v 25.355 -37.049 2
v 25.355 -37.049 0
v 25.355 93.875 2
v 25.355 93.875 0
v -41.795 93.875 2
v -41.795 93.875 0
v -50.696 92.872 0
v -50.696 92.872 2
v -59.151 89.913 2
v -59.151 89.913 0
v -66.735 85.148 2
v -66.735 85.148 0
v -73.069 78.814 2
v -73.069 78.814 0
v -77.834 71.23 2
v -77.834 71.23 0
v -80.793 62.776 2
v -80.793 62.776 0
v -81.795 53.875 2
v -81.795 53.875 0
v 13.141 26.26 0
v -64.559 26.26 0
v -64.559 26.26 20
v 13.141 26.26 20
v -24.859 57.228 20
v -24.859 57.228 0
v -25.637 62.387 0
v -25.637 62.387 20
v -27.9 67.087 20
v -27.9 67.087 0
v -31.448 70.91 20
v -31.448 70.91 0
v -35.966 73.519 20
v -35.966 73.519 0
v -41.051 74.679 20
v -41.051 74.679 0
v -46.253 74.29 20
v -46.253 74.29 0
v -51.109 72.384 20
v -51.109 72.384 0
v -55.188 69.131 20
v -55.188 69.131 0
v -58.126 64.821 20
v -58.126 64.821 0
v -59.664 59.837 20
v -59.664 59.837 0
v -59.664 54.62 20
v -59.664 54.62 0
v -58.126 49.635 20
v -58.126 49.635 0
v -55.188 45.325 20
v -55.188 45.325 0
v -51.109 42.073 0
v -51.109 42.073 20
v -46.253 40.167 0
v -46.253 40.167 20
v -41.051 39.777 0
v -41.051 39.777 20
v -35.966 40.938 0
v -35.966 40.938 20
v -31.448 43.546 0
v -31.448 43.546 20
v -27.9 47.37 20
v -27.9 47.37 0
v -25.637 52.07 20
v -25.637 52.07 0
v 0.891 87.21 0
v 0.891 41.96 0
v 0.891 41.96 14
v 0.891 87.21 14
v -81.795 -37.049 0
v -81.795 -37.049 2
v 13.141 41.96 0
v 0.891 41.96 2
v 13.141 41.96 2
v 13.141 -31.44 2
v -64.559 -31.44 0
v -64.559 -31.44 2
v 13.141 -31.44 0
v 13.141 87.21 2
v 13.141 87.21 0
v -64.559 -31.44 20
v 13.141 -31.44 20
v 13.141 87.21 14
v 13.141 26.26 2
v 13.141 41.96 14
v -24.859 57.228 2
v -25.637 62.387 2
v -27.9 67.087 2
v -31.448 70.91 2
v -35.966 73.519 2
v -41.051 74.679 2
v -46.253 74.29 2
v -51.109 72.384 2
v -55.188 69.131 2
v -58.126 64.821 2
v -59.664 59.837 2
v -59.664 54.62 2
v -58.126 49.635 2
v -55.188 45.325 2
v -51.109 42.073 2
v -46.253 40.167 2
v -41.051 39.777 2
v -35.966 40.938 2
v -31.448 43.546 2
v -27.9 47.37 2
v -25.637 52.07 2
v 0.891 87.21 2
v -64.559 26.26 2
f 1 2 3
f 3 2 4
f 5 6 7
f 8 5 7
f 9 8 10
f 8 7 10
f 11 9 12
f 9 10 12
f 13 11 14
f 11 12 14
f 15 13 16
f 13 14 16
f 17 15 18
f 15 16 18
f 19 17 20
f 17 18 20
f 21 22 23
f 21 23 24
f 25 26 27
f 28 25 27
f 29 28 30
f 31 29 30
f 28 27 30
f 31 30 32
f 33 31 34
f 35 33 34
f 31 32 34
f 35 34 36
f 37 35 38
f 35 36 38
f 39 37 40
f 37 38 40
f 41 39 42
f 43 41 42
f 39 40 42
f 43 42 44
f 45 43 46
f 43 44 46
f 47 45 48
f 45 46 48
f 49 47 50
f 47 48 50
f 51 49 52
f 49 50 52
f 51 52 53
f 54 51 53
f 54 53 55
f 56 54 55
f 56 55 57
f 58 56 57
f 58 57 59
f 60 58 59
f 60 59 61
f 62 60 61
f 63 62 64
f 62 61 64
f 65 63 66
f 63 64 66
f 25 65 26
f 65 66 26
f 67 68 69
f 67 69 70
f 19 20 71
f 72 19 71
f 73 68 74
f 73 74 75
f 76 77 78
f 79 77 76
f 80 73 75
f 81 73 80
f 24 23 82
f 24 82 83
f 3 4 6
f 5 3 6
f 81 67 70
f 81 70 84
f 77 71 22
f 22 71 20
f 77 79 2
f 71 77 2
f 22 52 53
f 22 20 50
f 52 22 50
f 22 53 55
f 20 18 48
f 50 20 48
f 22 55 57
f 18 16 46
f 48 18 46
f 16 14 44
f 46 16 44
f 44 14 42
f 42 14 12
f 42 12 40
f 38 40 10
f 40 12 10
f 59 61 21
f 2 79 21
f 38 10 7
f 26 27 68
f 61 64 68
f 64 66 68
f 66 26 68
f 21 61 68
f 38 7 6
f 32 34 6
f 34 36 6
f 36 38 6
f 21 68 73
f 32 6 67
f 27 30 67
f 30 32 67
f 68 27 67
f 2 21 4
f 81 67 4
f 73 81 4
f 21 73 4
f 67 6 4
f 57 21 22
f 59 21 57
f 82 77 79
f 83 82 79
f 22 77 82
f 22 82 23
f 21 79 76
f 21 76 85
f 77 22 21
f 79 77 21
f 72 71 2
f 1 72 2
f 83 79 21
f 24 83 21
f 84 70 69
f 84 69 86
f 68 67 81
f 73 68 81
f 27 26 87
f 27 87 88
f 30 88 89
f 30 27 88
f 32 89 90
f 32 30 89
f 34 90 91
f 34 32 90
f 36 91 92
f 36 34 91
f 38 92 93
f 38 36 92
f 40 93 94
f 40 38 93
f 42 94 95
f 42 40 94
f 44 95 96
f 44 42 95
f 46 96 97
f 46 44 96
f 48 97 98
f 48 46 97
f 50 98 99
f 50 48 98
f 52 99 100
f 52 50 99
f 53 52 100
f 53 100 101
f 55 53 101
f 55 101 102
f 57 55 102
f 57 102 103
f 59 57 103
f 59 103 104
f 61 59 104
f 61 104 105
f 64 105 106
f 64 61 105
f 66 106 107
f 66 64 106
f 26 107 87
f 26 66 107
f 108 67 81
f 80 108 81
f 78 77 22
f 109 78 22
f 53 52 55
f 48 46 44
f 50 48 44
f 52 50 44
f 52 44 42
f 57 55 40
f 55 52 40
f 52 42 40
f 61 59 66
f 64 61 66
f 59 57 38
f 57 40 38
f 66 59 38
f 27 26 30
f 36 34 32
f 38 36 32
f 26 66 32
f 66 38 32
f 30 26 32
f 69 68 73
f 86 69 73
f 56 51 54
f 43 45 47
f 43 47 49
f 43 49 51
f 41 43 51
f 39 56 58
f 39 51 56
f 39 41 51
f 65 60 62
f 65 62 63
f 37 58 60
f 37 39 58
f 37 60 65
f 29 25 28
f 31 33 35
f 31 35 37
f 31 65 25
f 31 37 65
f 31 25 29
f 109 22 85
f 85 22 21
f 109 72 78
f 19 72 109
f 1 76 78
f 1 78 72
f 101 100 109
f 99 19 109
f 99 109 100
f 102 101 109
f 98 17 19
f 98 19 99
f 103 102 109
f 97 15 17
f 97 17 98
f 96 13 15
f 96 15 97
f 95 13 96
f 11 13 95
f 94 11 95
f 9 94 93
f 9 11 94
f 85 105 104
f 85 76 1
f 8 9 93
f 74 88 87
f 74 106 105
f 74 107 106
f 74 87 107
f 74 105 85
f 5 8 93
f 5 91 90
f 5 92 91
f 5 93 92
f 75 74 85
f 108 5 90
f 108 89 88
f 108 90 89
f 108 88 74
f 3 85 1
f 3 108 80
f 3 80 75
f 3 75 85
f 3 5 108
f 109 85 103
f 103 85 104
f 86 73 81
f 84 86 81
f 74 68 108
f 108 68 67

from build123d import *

# Parameters (mm, degrees)
F0_R     = 17.5
F1_DEPTH = 20
F0_W     = 12.25
F0_H     = 45.25
F2_DEPTH = 14
F0_W_2   = 77.7
F0_H_2   = 57.7
F3_DEPTH = 20
F4_DEPTH = 2


with BuildPart() as f1:
    # F0 (on Top) → F1 (new body)
    with BuildSketch(Plane.XY):
        with Locations((-42.359097, 57.228414)):
            Circle(F0_R)
    extrude(amount=F1_DEPTH)


with BuildPart() as f2:
    # F0 (on Top) → F2 (new body)
    with BuildSketch(Plane.XY):
        with Locations((7.015903, 64.584966)):
            Rectangle(F0_W, F0_H)
    extrude(amount=F2_DEPTH)


with BuildPart() as f3:
    # F0 (on Top) → F3 (new body)
    with BuildSketch(Plane.XY):
        with Locations((-25.709097, -2.590034)):
            Rectangle(F0_W_2, F0_H_2)
    extrude(amount=F3_DEPTH)


with BuildPart() as f4:
    # F0 (on Top) → F4 (new body)
    with BuildSketch(Plane.XY):
        with BuildLine():
            Line((-81.795476, -37.048921), (25.355306, -37.048921))
            Line((25.355306, -37.048921), (25.355306, 93.874726))
            Line((25.355306, 93.874726), (-41.795476, 93.874726))
            ThreePointArc((-41.795476, 93.874726), (-70.079748, 82.158998), (-81.795476, 53.874726))
            Line((-81.795476, 53.874726), (-81.795476, -37.048921))
        make_face()
        with Locations((-25.709097, -2.590034)):
            Rectangle(F0_W_2, F0_H_2, mode=Mode.SUBTRACT)
        with Locations((-42.359097, 57.228414)):
            Circle(F0_R, mode=Mode.SUBTRACT)
        with Locations((7.015903, 64.584966)):
            Rectangle(F0_W, F0_H, mode=Mode.SUBTRACT)
    extrude(amount=F4_DEPTH)


solid = Compound([f1.part, f2.part, f3.part, f4.part])
